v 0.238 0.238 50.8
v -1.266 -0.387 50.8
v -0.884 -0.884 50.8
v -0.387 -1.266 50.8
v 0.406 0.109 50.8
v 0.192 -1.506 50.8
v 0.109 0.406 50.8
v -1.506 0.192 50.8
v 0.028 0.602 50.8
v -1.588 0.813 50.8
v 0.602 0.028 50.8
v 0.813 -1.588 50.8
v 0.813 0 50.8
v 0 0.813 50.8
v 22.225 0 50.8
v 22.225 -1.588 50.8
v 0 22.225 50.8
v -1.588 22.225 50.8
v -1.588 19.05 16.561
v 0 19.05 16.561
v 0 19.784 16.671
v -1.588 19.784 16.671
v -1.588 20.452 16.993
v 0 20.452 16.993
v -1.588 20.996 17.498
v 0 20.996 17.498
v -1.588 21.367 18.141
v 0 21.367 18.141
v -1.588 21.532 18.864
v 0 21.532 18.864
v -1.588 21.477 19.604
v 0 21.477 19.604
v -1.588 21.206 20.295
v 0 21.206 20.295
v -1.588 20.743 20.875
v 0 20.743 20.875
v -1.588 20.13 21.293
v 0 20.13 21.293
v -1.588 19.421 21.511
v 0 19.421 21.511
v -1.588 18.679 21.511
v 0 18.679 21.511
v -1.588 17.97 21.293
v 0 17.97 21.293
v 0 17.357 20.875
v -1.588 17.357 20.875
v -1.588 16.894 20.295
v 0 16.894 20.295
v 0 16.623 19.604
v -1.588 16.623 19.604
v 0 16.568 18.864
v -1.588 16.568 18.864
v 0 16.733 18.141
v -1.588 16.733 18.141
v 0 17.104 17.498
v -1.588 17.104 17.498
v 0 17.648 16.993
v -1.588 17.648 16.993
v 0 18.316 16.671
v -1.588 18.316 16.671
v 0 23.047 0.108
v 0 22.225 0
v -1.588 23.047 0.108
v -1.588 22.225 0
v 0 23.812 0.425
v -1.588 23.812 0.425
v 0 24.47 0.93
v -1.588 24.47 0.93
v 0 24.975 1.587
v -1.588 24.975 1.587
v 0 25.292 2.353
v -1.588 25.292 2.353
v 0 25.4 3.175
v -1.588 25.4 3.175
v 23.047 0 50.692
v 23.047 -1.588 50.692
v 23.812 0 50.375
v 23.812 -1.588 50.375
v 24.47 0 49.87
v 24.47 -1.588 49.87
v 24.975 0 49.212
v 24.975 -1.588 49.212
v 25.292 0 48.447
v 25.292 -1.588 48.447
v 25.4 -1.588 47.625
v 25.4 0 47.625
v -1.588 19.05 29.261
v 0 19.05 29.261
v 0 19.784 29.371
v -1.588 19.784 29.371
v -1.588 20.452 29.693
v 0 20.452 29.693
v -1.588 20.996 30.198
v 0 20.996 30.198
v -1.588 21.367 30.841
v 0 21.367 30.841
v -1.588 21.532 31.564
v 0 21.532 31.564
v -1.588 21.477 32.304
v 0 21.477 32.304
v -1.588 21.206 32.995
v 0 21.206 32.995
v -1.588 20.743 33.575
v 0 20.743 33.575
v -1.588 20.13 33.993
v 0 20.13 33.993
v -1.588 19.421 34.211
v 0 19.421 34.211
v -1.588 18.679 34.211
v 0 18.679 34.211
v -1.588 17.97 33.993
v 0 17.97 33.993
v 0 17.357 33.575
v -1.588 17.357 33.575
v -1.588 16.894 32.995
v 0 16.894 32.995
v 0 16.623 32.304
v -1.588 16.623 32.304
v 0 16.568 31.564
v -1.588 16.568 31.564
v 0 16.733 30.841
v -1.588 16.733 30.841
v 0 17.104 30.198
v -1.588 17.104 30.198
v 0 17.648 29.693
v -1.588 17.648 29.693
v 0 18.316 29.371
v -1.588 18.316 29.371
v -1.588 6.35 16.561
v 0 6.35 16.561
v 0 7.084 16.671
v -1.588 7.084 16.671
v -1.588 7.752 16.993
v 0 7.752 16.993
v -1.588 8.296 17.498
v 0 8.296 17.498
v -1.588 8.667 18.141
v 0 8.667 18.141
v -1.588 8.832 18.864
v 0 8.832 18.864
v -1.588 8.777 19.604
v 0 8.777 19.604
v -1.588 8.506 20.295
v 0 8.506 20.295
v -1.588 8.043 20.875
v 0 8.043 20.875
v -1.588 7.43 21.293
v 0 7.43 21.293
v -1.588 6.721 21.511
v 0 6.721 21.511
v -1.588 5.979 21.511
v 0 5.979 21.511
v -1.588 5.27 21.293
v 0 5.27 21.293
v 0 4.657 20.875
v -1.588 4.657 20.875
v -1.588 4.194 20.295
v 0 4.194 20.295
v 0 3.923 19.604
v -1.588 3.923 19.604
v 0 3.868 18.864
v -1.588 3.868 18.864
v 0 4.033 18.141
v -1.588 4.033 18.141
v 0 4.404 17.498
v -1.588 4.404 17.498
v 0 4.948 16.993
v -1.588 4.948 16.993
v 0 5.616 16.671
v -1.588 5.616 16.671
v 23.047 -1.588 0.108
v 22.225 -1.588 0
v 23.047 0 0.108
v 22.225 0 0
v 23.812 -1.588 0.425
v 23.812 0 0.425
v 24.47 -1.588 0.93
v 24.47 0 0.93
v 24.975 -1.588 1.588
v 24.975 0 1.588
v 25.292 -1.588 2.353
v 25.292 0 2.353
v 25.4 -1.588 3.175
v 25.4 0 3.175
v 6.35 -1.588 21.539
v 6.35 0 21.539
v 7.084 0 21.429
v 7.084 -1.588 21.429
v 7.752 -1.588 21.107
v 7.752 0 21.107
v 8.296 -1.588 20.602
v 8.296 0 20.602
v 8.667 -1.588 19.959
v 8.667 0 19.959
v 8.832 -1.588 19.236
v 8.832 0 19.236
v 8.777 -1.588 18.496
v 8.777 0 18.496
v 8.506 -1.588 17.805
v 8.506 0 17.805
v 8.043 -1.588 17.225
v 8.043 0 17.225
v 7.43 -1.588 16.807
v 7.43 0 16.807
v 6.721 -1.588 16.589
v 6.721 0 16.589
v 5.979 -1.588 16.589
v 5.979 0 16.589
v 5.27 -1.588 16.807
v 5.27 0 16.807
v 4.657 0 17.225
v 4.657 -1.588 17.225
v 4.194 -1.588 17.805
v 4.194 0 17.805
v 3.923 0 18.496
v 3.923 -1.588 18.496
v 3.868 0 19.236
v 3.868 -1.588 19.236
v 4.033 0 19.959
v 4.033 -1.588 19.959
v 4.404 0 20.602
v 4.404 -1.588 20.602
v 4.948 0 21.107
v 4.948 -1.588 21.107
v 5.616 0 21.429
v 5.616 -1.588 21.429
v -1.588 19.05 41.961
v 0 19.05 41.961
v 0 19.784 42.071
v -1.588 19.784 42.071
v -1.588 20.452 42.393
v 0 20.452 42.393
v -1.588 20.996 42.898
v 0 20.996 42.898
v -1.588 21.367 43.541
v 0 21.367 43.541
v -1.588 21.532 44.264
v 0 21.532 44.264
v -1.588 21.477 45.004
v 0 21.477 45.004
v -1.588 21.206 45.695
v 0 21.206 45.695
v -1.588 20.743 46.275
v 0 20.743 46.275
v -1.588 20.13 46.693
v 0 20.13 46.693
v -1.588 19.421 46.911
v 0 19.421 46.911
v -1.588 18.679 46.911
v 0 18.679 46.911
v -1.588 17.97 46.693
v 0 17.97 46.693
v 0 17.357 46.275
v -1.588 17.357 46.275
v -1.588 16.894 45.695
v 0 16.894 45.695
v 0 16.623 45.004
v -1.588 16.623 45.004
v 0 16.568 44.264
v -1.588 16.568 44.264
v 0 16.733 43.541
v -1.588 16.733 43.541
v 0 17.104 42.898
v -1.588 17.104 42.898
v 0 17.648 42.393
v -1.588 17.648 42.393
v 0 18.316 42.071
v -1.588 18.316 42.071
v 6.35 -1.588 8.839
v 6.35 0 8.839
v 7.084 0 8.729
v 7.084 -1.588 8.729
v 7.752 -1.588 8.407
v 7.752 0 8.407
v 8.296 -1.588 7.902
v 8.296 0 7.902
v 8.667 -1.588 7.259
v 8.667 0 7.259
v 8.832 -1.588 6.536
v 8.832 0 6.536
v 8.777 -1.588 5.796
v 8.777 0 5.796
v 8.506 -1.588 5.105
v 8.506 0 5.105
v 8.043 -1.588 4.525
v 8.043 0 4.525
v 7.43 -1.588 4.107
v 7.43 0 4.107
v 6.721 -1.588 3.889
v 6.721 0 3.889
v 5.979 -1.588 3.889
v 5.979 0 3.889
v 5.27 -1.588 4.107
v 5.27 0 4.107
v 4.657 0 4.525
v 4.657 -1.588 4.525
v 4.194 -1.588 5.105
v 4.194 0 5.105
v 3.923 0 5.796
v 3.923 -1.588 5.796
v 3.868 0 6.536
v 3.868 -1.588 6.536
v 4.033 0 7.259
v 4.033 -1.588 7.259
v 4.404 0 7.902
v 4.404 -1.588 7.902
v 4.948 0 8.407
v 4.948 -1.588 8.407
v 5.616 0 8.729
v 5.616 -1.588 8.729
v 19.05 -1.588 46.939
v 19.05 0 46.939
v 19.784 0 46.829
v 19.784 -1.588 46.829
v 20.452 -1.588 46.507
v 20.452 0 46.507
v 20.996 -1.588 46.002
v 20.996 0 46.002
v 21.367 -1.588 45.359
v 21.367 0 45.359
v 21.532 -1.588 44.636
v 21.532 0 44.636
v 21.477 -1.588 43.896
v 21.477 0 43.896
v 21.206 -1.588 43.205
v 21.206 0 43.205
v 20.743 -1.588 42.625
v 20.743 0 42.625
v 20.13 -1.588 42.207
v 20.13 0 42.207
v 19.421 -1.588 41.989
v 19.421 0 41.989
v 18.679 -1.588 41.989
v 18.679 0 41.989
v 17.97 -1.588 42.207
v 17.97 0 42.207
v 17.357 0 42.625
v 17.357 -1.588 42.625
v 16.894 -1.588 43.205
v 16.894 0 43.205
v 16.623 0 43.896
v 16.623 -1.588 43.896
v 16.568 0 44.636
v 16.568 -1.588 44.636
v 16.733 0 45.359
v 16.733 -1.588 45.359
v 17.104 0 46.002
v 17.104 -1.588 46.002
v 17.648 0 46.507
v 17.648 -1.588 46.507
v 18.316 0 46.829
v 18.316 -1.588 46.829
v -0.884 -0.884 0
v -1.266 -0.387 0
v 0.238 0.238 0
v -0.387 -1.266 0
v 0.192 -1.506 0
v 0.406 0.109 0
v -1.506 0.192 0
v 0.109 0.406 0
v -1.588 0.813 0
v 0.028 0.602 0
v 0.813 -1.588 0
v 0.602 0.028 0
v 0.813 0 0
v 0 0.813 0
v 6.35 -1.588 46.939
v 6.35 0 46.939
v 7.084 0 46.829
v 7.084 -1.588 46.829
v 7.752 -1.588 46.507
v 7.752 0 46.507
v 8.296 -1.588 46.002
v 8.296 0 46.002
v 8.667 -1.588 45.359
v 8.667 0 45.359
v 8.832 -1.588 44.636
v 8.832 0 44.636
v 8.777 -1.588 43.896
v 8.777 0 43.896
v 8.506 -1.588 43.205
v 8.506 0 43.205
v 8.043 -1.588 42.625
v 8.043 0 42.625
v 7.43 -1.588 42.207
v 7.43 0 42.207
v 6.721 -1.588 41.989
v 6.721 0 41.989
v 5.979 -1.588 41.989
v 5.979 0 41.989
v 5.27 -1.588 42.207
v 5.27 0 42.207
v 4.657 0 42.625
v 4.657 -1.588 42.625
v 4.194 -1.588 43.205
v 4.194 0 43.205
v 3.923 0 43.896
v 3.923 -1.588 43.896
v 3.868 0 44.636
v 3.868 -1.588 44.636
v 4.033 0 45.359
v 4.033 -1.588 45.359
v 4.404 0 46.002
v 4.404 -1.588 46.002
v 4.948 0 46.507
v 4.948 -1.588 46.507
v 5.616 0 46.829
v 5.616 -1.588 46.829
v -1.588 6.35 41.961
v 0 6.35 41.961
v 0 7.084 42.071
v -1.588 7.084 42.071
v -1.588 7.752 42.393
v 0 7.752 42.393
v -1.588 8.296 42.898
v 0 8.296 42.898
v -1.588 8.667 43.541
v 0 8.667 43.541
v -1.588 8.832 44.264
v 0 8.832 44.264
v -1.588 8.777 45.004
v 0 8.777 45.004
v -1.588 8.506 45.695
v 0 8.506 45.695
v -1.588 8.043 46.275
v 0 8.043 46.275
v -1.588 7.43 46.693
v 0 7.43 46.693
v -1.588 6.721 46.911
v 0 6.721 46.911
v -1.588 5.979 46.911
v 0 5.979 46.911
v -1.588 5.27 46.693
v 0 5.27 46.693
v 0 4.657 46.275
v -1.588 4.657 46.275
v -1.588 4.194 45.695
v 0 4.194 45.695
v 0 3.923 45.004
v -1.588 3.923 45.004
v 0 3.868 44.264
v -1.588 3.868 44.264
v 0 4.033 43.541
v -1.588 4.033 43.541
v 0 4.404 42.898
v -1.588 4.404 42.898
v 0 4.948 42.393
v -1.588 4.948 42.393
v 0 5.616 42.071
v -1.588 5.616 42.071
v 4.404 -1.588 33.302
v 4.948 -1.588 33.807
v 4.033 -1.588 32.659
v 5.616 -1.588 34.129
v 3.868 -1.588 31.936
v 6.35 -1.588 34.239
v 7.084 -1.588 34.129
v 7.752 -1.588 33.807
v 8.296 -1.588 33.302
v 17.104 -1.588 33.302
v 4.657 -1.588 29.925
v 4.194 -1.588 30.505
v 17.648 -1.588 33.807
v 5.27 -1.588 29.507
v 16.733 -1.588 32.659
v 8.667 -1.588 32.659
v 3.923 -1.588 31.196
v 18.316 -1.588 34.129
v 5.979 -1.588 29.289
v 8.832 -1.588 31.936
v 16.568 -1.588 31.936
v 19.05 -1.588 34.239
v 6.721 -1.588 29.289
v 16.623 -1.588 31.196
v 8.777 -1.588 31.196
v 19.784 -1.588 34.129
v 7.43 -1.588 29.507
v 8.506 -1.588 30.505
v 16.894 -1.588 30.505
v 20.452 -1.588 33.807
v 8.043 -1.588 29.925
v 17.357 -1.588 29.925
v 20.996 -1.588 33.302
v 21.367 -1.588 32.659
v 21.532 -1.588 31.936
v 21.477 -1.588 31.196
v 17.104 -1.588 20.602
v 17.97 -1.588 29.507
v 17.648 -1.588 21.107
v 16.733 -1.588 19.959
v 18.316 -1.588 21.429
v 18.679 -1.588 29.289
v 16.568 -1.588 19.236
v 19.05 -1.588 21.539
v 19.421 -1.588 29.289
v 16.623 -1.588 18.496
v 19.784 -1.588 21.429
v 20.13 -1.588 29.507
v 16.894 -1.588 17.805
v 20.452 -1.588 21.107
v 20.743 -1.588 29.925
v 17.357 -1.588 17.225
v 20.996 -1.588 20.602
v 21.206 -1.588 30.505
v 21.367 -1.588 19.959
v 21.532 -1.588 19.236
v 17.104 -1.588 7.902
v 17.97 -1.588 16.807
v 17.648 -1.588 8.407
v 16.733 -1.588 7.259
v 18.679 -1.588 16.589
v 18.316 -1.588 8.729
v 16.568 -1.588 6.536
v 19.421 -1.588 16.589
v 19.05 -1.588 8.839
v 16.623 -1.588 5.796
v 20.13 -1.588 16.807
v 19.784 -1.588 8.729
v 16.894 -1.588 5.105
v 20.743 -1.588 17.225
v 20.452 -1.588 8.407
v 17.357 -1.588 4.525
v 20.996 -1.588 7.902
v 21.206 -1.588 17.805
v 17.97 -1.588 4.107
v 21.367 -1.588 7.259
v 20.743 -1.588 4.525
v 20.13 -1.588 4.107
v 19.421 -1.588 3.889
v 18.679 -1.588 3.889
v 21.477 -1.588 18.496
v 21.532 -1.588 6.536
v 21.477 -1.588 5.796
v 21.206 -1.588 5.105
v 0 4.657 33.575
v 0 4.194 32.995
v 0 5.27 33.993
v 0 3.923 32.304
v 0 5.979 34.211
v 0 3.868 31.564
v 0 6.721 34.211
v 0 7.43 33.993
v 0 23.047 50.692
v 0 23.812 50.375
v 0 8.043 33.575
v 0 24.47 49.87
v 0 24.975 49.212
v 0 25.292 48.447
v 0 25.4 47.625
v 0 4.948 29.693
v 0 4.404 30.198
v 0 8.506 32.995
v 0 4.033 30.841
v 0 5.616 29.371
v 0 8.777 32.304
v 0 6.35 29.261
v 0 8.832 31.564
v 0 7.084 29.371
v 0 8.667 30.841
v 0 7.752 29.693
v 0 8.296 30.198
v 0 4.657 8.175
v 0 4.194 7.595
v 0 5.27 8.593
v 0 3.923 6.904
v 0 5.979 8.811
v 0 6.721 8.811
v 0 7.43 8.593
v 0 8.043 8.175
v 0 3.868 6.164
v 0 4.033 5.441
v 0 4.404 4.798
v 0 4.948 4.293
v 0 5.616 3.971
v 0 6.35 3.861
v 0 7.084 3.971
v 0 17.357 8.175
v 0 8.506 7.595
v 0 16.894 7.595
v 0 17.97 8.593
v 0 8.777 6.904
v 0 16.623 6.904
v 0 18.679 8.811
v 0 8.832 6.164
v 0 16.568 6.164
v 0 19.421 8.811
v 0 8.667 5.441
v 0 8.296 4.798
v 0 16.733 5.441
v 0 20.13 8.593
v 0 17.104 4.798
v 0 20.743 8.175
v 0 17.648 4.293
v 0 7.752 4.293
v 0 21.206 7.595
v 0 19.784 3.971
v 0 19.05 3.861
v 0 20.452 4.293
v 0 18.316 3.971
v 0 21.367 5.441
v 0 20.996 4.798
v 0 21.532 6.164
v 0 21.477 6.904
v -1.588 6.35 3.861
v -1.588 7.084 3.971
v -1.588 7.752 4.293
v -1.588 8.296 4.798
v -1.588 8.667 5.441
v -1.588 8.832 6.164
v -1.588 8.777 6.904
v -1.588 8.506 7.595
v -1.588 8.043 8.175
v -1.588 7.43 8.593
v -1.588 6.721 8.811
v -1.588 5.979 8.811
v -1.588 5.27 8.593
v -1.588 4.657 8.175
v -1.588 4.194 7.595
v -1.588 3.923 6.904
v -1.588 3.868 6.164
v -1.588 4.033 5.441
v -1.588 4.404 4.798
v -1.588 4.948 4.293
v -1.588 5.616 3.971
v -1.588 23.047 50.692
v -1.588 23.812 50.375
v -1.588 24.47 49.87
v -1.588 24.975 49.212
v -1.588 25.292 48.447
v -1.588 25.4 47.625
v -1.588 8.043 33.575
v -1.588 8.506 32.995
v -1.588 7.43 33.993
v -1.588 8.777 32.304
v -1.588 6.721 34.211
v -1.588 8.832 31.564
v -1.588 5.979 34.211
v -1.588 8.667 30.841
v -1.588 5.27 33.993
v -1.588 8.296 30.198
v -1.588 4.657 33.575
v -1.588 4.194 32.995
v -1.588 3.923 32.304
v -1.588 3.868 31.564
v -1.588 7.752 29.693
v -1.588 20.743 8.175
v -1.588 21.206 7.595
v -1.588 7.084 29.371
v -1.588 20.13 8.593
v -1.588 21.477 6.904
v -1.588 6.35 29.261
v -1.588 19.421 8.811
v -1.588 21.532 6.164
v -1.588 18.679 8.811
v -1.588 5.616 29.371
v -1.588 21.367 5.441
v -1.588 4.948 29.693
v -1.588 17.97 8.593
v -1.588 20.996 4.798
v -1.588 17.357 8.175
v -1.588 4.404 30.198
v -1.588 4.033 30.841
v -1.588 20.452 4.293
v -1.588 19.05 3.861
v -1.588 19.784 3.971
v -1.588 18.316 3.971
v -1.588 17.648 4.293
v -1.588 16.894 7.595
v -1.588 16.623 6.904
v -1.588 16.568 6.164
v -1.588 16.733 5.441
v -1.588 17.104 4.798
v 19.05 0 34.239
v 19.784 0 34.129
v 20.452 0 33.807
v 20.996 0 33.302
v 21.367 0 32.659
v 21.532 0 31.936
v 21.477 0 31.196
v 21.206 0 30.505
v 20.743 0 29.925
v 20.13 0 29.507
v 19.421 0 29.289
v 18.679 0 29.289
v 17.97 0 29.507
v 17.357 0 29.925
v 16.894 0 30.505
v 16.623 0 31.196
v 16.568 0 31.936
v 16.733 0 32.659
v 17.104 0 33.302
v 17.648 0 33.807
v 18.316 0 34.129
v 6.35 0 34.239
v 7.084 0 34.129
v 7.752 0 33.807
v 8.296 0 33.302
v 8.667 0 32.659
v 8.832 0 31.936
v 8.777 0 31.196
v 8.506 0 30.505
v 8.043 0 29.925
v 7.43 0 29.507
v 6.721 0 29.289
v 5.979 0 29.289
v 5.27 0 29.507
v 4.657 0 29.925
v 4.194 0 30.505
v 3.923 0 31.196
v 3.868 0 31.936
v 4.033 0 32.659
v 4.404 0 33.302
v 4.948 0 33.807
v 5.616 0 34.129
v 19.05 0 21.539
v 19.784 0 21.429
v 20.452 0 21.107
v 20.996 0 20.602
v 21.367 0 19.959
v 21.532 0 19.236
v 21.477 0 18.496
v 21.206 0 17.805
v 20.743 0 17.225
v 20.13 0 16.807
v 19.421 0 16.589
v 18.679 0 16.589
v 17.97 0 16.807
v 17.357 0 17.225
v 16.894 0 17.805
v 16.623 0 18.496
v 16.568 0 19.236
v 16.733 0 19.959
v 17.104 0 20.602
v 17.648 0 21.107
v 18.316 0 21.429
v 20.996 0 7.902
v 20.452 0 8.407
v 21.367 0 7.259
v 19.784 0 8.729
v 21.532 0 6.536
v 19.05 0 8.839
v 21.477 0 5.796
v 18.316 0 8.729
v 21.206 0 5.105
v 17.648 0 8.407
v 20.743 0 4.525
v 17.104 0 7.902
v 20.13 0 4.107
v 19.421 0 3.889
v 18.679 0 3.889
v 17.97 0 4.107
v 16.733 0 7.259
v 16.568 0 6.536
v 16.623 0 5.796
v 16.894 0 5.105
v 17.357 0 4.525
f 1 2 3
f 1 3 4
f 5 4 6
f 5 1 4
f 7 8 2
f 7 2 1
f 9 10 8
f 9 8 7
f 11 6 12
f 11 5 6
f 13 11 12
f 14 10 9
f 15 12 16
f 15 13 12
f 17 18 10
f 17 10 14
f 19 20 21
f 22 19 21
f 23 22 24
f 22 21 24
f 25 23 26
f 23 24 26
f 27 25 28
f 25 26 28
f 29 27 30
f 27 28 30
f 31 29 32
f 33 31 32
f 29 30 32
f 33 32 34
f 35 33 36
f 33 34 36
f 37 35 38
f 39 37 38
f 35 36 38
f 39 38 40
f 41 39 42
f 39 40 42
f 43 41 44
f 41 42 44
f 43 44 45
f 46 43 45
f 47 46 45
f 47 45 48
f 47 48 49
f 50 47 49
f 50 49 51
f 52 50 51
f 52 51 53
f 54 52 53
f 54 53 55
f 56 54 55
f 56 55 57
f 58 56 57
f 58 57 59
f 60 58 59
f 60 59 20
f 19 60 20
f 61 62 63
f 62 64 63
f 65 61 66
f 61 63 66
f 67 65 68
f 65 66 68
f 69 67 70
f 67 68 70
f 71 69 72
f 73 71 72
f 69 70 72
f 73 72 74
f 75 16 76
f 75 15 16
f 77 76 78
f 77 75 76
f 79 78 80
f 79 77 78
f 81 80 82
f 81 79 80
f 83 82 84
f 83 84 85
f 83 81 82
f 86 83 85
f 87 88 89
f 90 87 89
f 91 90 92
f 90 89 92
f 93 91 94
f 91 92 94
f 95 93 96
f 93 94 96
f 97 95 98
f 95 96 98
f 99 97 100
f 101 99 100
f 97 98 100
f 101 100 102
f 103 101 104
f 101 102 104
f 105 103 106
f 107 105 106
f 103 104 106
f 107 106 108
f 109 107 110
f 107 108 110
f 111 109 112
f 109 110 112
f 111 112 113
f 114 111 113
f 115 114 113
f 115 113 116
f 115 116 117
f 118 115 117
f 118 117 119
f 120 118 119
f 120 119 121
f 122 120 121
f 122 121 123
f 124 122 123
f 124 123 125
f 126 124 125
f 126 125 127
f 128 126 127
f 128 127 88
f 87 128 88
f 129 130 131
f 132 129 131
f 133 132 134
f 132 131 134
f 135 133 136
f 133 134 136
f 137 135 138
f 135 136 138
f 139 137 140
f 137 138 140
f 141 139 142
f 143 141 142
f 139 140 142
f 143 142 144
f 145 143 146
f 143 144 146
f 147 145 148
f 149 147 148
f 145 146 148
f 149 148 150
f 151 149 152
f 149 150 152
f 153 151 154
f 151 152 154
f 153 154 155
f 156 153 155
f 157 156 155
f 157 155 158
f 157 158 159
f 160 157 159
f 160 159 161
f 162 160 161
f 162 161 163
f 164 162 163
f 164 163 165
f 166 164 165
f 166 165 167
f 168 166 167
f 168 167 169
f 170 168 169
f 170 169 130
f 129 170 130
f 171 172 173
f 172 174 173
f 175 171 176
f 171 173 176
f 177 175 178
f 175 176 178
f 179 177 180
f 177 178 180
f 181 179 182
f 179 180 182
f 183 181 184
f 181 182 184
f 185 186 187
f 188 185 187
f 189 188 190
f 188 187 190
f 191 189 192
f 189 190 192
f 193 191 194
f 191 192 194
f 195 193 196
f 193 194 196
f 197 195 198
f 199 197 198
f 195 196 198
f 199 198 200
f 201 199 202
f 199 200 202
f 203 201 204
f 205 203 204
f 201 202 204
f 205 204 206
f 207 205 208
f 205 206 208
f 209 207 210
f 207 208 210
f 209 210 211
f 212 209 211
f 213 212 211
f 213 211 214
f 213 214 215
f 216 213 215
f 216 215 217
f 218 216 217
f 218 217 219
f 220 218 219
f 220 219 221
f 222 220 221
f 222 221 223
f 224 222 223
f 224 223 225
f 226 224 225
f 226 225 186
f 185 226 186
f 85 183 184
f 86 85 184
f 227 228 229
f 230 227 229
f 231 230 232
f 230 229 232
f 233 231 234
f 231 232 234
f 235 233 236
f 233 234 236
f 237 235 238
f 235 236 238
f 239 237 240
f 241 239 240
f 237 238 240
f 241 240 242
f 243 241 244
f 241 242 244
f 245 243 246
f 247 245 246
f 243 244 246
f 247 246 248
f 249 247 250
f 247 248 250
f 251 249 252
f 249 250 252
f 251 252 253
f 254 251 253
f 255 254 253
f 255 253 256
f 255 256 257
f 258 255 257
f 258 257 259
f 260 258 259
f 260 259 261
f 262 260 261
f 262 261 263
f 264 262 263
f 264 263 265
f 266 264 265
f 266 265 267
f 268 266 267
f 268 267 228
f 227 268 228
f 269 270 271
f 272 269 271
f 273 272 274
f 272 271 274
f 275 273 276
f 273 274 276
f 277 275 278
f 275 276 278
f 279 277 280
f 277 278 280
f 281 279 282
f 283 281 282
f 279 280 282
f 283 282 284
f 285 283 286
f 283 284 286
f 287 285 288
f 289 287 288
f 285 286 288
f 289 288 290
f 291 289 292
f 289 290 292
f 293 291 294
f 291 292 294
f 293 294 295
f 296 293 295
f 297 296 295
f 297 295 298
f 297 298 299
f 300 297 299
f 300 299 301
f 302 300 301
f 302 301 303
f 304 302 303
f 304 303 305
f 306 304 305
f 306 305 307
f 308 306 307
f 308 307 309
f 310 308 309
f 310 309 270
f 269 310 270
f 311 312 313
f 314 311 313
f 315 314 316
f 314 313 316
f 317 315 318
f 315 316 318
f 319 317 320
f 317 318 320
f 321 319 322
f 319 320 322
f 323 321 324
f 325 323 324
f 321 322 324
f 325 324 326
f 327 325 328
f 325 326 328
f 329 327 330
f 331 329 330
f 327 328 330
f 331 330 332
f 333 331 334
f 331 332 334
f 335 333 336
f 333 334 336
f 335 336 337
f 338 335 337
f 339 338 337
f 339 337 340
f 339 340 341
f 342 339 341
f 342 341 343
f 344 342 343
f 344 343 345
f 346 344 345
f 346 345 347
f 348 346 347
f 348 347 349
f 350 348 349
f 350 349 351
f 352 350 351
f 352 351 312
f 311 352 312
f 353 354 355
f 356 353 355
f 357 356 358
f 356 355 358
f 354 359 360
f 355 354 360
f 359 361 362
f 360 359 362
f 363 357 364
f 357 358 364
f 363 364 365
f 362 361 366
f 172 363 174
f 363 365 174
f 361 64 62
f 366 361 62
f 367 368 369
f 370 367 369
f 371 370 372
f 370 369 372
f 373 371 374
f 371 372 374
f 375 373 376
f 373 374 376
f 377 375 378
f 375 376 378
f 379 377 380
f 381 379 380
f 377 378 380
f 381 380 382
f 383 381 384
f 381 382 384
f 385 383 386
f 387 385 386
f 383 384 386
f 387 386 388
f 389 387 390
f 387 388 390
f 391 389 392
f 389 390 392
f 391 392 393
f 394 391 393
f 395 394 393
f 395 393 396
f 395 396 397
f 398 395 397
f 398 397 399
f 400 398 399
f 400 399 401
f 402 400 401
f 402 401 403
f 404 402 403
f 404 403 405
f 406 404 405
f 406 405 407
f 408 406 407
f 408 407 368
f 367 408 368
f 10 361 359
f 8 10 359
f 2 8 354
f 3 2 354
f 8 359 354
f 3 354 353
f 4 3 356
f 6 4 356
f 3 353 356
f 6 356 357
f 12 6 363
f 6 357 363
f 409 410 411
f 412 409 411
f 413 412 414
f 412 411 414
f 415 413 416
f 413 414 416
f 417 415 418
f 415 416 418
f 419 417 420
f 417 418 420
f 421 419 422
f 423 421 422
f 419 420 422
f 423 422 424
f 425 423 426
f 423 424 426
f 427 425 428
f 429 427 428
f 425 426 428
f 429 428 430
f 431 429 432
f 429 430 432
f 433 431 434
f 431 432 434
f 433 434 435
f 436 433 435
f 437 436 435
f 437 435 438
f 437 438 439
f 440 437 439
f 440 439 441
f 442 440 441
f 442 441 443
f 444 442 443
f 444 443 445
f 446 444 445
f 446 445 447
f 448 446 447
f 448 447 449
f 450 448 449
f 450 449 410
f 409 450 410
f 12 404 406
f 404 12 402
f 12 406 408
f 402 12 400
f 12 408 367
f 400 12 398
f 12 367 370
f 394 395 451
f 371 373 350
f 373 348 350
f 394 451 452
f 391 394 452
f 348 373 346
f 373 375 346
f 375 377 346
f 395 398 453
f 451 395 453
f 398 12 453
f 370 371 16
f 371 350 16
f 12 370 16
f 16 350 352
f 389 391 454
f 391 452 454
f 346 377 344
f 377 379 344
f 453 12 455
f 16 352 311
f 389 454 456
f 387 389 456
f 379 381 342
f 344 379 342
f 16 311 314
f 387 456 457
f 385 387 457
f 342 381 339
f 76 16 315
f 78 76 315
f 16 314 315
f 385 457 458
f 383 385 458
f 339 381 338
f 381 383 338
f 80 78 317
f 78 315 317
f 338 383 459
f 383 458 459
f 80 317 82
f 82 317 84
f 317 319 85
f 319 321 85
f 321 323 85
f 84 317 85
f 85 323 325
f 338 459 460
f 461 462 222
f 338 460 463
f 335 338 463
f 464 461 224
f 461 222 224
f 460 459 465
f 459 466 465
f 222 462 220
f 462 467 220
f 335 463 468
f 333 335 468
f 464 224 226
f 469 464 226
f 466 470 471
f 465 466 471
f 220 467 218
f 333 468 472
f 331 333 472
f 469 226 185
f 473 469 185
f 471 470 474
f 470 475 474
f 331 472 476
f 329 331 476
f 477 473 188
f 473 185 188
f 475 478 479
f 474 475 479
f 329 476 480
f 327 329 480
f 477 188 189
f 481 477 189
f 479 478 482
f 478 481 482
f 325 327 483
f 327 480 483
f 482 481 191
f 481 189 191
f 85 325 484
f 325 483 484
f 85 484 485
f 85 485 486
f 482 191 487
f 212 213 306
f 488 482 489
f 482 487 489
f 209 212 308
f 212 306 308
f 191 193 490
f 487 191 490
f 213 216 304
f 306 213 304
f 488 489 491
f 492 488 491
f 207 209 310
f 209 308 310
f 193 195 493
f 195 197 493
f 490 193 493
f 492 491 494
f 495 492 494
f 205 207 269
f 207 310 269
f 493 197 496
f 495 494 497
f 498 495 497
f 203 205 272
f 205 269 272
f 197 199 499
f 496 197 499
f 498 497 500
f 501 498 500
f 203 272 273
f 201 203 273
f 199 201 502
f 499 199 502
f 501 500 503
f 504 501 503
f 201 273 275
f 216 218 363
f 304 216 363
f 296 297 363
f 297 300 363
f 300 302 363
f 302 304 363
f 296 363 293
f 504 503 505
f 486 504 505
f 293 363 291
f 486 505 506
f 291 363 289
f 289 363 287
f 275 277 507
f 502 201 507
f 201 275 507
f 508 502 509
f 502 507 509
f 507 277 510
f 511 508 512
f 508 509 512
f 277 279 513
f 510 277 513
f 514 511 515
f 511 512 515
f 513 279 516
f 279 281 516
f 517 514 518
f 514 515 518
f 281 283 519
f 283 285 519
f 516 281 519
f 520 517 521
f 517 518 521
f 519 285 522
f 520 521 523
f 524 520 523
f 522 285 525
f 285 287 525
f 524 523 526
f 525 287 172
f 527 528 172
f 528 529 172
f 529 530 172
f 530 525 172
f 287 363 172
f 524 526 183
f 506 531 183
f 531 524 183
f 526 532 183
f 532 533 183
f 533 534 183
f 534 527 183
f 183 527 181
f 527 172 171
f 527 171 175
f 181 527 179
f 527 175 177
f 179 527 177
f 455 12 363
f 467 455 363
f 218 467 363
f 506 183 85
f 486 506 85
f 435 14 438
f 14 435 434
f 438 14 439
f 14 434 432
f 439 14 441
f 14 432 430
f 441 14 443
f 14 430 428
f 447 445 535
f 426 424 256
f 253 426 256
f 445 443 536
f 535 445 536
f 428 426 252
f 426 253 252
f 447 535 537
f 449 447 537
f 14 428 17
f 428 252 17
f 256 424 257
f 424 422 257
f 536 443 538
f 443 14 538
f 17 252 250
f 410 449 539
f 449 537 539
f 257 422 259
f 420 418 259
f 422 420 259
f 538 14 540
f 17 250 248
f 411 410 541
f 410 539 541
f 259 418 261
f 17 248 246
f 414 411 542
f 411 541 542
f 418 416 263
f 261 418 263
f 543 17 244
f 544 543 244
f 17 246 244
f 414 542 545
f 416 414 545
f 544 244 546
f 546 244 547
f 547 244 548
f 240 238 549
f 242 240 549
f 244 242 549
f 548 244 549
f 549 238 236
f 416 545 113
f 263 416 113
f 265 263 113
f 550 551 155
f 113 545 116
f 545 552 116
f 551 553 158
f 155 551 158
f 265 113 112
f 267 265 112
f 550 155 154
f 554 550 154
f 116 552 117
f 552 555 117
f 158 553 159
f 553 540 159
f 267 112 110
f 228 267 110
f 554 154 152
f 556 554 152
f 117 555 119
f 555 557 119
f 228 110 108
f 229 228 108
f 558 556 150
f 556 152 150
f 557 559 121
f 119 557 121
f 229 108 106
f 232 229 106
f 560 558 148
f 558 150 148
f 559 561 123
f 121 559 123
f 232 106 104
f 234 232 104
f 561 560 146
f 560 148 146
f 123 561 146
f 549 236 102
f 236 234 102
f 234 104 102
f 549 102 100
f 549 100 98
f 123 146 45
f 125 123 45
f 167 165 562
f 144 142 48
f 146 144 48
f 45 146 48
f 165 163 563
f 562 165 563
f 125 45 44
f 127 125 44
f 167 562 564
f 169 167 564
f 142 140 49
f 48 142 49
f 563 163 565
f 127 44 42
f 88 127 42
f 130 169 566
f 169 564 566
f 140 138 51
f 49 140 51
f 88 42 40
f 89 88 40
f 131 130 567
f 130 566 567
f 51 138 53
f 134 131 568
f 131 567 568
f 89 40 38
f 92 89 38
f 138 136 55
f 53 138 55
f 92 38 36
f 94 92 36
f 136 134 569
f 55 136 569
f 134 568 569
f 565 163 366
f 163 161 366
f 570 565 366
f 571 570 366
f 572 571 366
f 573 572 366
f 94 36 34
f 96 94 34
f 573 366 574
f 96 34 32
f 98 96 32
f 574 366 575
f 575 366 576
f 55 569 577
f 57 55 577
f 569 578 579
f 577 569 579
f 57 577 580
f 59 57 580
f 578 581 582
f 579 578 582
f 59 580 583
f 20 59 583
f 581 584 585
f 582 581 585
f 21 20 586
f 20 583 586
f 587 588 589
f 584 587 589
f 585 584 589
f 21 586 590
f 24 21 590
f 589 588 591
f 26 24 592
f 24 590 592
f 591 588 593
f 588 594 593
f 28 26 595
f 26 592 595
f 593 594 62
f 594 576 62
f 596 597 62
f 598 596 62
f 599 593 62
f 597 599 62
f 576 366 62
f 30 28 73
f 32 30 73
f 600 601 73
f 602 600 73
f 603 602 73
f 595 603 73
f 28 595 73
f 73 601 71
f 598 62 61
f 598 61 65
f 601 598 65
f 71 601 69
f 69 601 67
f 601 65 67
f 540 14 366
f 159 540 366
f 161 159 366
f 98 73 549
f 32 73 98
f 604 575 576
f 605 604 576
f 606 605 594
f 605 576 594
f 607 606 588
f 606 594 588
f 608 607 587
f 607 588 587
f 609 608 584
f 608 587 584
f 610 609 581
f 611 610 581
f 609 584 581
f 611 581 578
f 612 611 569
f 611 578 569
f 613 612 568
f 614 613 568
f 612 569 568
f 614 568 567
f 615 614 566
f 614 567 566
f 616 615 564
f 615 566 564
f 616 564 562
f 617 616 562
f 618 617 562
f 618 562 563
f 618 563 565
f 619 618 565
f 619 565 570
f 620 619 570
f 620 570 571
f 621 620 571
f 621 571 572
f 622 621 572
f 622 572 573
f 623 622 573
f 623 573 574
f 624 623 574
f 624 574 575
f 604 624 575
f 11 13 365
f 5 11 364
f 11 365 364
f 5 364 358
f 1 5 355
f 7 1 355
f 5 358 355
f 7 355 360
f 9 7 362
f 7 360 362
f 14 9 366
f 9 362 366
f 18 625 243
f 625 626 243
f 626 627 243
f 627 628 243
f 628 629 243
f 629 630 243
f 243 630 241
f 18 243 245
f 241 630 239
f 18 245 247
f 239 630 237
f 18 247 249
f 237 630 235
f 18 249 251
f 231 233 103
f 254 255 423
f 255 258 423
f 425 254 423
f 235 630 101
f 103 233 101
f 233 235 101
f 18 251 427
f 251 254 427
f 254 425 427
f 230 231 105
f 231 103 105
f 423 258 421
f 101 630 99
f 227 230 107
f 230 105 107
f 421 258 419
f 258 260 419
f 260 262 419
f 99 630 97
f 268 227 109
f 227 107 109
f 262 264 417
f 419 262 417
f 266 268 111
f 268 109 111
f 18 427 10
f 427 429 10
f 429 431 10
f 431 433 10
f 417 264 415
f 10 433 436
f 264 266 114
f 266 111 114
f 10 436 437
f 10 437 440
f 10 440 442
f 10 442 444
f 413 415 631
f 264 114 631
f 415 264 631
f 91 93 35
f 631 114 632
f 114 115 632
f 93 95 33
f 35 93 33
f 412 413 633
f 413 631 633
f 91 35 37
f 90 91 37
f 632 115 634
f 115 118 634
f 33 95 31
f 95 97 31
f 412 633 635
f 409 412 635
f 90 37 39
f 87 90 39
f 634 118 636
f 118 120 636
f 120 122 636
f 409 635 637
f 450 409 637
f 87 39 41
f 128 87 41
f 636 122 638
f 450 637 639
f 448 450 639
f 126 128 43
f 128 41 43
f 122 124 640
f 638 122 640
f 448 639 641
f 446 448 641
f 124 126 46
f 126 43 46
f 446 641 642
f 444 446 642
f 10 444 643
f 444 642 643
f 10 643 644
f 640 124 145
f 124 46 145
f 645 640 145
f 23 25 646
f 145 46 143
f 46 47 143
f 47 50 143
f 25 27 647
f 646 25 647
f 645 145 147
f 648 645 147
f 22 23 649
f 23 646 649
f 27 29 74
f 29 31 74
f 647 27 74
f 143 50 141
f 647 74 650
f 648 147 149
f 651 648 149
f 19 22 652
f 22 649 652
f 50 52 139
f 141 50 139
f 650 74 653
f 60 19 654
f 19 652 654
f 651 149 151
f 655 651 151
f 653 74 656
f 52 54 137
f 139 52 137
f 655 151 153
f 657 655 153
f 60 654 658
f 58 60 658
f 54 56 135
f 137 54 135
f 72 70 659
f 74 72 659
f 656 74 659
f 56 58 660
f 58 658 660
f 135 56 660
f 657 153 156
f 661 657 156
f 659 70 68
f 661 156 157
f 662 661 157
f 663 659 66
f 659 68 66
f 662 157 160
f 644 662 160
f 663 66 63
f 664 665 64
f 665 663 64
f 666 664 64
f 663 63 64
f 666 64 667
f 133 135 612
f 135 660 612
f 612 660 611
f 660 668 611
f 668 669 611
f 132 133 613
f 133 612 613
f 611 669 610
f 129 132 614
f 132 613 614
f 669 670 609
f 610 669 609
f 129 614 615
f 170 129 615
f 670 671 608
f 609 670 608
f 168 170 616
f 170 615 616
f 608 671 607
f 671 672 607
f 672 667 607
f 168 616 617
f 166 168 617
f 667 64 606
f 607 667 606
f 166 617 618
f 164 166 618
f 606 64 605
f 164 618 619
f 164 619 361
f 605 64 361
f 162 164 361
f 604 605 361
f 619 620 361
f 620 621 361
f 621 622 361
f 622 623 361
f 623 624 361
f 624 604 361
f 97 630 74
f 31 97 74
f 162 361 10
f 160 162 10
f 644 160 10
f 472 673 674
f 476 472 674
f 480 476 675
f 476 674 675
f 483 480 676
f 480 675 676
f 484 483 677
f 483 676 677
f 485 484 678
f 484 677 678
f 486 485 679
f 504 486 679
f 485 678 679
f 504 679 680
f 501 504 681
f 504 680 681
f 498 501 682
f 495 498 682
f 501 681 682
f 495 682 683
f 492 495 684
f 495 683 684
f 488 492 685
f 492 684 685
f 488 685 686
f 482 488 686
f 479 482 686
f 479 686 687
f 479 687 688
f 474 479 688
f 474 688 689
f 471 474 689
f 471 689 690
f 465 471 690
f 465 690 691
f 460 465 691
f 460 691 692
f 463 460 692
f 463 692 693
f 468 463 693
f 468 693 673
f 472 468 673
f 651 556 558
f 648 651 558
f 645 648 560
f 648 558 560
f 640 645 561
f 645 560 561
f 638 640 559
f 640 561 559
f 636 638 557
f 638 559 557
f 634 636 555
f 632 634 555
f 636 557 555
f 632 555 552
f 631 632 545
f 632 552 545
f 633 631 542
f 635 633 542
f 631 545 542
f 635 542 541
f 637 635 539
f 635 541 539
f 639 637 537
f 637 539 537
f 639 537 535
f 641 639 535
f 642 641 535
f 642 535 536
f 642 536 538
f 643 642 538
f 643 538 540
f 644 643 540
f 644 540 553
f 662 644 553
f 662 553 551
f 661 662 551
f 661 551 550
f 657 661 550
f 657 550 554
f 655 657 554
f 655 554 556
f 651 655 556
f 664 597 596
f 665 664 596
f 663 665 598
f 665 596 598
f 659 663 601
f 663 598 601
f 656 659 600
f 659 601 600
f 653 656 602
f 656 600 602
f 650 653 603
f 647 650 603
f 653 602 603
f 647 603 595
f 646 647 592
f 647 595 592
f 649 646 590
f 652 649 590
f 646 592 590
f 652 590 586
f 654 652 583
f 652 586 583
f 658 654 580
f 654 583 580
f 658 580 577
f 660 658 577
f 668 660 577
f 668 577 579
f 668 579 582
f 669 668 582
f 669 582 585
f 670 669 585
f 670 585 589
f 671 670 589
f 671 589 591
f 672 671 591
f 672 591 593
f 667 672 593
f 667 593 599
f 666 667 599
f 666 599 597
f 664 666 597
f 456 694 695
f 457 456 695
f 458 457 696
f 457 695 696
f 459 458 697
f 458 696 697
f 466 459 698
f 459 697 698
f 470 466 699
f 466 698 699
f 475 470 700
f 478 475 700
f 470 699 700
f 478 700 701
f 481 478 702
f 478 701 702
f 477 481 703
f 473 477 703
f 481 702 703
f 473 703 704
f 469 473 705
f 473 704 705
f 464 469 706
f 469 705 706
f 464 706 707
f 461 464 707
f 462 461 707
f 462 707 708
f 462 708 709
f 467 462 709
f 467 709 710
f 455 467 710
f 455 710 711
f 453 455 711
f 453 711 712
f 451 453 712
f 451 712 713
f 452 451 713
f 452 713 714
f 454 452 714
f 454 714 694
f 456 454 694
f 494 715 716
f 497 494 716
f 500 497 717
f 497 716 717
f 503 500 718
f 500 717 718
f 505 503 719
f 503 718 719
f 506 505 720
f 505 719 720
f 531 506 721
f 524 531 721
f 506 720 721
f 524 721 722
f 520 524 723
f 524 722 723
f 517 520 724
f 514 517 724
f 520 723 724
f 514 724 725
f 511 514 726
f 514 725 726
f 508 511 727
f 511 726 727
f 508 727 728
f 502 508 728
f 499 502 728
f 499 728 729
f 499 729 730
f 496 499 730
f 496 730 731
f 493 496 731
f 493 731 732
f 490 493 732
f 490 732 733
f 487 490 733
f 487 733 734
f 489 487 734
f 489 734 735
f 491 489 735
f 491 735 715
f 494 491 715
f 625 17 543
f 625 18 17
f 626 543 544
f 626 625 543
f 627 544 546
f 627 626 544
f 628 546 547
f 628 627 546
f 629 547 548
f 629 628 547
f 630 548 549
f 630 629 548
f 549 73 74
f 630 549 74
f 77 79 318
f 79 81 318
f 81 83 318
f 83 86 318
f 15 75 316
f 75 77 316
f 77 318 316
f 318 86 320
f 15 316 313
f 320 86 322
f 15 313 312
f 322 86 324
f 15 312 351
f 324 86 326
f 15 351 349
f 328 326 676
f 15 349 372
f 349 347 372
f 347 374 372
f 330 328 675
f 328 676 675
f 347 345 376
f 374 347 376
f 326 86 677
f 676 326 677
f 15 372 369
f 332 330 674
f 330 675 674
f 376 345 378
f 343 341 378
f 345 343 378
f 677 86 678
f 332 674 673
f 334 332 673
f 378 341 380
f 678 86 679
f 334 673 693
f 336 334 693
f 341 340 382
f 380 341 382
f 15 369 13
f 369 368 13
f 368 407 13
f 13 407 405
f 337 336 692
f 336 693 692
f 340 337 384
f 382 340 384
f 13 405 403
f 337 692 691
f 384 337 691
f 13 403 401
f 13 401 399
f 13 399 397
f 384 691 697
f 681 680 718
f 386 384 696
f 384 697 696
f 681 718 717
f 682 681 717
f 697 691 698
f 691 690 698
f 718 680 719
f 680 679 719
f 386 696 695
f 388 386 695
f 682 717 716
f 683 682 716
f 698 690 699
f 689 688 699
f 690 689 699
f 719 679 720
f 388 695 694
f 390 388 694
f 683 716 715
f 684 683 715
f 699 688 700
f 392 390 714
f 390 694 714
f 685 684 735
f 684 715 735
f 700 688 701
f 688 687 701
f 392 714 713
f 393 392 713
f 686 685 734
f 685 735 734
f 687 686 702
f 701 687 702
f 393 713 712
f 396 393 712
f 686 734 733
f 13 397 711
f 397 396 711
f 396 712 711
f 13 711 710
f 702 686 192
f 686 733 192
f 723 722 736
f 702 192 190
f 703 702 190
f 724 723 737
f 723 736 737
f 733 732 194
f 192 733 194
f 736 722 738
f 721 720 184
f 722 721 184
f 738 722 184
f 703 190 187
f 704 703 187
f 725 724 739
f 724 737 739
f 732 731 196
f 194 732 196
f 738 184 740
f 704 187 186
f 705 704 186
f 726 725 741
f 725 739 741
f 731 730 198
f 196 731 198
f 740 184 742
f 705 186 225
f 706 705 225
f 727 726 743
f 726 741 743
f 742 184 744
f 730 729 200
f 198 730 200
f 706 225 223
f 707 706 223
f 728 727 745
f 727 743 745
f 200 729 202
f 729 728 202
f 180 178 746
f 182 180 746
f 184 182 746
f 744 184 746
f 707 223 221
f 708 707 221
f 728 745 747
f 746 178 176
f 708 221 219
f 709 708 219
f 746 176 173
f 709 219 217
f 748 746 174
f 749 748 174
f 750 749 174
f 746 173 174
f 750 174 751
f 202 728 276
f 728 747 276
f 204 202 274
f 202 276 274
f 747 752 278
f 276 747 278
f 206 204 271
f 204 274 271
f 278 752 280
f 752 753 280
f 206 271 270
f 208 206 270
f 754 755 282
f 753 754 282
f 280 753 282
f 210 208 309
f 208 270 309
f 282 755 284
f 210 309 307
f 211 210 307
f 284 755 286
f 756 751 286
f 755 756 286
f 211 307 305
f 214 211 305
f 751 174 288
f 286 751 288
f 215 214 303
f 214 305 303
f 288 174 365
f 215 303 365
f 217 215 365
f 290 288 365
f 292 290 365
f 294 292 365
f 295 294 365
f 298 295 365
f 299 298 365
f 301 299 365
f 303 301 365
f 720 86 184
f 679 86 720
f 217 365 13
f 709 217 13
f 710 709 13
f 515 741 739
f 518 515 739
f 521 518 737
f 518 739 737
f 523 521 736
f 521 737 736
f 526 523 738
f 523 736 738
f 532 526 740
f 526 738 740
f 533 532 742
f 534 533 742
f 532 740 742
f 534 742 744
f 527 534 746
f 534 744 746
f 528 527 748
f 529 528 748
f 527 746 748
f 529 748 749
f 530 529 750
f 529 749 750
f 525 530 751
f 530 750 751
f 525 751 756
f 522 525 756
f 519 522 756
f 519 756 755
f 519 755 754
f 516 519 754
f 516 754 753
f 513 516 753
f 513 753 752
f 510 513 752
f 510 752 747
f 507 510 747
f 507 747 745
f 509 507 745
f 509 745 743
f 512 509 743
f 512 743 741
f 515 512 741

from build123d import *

# Parameters (mm, degrees)
BASE_FLANGE1_DEPTH = 50.8
SKETCH6_R          = 2.4892
CUT_EXTRUDE1_DEPTH = 63.217039467
SKETCH7_R          = 2.4892
CUT_EXTRUDE2_DEPTH = 63.217039467
FILLET1_R          = 3.175


# Read off the part's stored shape, not the designer's step: Base-Flange1
with BuildPart() as part:
    # Base-Flange1 outline → Base-Flange1 (new body)
    with BuildSketch(Plane.XY):
        with BuildLine():
            Line((0.8128, -1.5875), (25.4, -1.5875))
            Line((25.4, -1.5875), (25.4, 0))
            Line((25.4, 0), (0.8128, 0))
            ThreePointArc((0.8128, 0), (0.238063608, 0.238063608), (0, 0.8128))
            Line((0, 0.8128), (0, 25.4))
            Line((0, 25.4), (-1.5875, 25.4))
            Line((-1.5875, 25.4), (-1.5875, 0.8128))
            ThreePointArc((-1.5875, 0.8128), (-0.884468407, -0.884468407), (0.8128, -1.5875))
        make_face()
    extrude(amount=BASE_FLANGE1_DEPTH)

    # Sketch6 → Cut-Extrude1 (cut, through all)
    with BuildSketch(Plane(origin=(0, 0, 0), x_dir=(0, 0, -1), z_dir=(1, 0, 0))):
        with Locations((-44.45, 19.05)):
            Circle(SKETCH6_R)
        with Locations((-31.75, 19.05)):
            Circle(SKETCH6_R)
        with Locations((-19.05, 19.05)):
            Circle(SKETCH6_R)
        with Locations((-6.35, 19.05)):
            Circle(SKETCH6_R)
        with Locations((-6.35, 6.35)):
            Circle(SKETCH6_R)
        with Locations((-19.05, 6.35)):
            Circle(SKETCH6_R)
        with Locations((-31.75, 6.35)):
            Circle(SKETCH6_R)
        with Locations((-44.45, 6.35)):
            Circle(SKETCH6_R)
    extrude(amount=-CUT_EXTRUDE1_DEPTH, mode=Mode.SUBTRACT)

    # Sketch7 → Cut-Extrude2 (cut, through all)
    with BuildSketch(Plane(origin=(0, 0, 0), x_dir=(1, 0, 0), z_dir=(0, 1, 0))):
        with Locations(Location((19.05, -6.35, 0), (0, 0, 270))):
            Circle(SKETCH7_R)
        with Locations(Location((19.05, -19.05, 0), (0, 0, 270))):
            Circle(SKETCH7_R)
        with Locations(Location((6.35, -19.05, 0), (0, 0, 270))):
            Circle(SKETCH7_R)
        with Locations(Location((6.35, -6.35, 0), (0, 0, 270))):
            Circle(SKETCH7_R)
        with Locations(Location((19.05, -31.75, 0), (0, 0, 270))):
            Circle(SKETCH7_R)
        with Locations(Location((19.05, -44.45, 0), (0, 0, 270))):
            Circle(SKETCH7_R)
        with Locations(Location((6.35, -31.75, 0), (0, 0, 270))):
            Circle(SKETCH7_R)
        with Locations(Location((6.35, -44.45, 0), (0, 0, 270))):
            Circle(SKETCH7_R)
    extrude(amount=-CUT_EXTRUDE2_DEPTH, mode=Mode.SUBTRACT)

    # Fillet1
    fillet1_edges = [part.edges().sort_by_distance(p)[0] for p in [
        (-0.79375, 25.4, 50.8),
        (-0.79375, 25.4, 0),
        (25.4, -0.79375, 50.8),
        (25.4, -0.79375, 0),
    ]]
    fillet(fillet1_edges, radius=FILLET1_R)


solid = part.part
